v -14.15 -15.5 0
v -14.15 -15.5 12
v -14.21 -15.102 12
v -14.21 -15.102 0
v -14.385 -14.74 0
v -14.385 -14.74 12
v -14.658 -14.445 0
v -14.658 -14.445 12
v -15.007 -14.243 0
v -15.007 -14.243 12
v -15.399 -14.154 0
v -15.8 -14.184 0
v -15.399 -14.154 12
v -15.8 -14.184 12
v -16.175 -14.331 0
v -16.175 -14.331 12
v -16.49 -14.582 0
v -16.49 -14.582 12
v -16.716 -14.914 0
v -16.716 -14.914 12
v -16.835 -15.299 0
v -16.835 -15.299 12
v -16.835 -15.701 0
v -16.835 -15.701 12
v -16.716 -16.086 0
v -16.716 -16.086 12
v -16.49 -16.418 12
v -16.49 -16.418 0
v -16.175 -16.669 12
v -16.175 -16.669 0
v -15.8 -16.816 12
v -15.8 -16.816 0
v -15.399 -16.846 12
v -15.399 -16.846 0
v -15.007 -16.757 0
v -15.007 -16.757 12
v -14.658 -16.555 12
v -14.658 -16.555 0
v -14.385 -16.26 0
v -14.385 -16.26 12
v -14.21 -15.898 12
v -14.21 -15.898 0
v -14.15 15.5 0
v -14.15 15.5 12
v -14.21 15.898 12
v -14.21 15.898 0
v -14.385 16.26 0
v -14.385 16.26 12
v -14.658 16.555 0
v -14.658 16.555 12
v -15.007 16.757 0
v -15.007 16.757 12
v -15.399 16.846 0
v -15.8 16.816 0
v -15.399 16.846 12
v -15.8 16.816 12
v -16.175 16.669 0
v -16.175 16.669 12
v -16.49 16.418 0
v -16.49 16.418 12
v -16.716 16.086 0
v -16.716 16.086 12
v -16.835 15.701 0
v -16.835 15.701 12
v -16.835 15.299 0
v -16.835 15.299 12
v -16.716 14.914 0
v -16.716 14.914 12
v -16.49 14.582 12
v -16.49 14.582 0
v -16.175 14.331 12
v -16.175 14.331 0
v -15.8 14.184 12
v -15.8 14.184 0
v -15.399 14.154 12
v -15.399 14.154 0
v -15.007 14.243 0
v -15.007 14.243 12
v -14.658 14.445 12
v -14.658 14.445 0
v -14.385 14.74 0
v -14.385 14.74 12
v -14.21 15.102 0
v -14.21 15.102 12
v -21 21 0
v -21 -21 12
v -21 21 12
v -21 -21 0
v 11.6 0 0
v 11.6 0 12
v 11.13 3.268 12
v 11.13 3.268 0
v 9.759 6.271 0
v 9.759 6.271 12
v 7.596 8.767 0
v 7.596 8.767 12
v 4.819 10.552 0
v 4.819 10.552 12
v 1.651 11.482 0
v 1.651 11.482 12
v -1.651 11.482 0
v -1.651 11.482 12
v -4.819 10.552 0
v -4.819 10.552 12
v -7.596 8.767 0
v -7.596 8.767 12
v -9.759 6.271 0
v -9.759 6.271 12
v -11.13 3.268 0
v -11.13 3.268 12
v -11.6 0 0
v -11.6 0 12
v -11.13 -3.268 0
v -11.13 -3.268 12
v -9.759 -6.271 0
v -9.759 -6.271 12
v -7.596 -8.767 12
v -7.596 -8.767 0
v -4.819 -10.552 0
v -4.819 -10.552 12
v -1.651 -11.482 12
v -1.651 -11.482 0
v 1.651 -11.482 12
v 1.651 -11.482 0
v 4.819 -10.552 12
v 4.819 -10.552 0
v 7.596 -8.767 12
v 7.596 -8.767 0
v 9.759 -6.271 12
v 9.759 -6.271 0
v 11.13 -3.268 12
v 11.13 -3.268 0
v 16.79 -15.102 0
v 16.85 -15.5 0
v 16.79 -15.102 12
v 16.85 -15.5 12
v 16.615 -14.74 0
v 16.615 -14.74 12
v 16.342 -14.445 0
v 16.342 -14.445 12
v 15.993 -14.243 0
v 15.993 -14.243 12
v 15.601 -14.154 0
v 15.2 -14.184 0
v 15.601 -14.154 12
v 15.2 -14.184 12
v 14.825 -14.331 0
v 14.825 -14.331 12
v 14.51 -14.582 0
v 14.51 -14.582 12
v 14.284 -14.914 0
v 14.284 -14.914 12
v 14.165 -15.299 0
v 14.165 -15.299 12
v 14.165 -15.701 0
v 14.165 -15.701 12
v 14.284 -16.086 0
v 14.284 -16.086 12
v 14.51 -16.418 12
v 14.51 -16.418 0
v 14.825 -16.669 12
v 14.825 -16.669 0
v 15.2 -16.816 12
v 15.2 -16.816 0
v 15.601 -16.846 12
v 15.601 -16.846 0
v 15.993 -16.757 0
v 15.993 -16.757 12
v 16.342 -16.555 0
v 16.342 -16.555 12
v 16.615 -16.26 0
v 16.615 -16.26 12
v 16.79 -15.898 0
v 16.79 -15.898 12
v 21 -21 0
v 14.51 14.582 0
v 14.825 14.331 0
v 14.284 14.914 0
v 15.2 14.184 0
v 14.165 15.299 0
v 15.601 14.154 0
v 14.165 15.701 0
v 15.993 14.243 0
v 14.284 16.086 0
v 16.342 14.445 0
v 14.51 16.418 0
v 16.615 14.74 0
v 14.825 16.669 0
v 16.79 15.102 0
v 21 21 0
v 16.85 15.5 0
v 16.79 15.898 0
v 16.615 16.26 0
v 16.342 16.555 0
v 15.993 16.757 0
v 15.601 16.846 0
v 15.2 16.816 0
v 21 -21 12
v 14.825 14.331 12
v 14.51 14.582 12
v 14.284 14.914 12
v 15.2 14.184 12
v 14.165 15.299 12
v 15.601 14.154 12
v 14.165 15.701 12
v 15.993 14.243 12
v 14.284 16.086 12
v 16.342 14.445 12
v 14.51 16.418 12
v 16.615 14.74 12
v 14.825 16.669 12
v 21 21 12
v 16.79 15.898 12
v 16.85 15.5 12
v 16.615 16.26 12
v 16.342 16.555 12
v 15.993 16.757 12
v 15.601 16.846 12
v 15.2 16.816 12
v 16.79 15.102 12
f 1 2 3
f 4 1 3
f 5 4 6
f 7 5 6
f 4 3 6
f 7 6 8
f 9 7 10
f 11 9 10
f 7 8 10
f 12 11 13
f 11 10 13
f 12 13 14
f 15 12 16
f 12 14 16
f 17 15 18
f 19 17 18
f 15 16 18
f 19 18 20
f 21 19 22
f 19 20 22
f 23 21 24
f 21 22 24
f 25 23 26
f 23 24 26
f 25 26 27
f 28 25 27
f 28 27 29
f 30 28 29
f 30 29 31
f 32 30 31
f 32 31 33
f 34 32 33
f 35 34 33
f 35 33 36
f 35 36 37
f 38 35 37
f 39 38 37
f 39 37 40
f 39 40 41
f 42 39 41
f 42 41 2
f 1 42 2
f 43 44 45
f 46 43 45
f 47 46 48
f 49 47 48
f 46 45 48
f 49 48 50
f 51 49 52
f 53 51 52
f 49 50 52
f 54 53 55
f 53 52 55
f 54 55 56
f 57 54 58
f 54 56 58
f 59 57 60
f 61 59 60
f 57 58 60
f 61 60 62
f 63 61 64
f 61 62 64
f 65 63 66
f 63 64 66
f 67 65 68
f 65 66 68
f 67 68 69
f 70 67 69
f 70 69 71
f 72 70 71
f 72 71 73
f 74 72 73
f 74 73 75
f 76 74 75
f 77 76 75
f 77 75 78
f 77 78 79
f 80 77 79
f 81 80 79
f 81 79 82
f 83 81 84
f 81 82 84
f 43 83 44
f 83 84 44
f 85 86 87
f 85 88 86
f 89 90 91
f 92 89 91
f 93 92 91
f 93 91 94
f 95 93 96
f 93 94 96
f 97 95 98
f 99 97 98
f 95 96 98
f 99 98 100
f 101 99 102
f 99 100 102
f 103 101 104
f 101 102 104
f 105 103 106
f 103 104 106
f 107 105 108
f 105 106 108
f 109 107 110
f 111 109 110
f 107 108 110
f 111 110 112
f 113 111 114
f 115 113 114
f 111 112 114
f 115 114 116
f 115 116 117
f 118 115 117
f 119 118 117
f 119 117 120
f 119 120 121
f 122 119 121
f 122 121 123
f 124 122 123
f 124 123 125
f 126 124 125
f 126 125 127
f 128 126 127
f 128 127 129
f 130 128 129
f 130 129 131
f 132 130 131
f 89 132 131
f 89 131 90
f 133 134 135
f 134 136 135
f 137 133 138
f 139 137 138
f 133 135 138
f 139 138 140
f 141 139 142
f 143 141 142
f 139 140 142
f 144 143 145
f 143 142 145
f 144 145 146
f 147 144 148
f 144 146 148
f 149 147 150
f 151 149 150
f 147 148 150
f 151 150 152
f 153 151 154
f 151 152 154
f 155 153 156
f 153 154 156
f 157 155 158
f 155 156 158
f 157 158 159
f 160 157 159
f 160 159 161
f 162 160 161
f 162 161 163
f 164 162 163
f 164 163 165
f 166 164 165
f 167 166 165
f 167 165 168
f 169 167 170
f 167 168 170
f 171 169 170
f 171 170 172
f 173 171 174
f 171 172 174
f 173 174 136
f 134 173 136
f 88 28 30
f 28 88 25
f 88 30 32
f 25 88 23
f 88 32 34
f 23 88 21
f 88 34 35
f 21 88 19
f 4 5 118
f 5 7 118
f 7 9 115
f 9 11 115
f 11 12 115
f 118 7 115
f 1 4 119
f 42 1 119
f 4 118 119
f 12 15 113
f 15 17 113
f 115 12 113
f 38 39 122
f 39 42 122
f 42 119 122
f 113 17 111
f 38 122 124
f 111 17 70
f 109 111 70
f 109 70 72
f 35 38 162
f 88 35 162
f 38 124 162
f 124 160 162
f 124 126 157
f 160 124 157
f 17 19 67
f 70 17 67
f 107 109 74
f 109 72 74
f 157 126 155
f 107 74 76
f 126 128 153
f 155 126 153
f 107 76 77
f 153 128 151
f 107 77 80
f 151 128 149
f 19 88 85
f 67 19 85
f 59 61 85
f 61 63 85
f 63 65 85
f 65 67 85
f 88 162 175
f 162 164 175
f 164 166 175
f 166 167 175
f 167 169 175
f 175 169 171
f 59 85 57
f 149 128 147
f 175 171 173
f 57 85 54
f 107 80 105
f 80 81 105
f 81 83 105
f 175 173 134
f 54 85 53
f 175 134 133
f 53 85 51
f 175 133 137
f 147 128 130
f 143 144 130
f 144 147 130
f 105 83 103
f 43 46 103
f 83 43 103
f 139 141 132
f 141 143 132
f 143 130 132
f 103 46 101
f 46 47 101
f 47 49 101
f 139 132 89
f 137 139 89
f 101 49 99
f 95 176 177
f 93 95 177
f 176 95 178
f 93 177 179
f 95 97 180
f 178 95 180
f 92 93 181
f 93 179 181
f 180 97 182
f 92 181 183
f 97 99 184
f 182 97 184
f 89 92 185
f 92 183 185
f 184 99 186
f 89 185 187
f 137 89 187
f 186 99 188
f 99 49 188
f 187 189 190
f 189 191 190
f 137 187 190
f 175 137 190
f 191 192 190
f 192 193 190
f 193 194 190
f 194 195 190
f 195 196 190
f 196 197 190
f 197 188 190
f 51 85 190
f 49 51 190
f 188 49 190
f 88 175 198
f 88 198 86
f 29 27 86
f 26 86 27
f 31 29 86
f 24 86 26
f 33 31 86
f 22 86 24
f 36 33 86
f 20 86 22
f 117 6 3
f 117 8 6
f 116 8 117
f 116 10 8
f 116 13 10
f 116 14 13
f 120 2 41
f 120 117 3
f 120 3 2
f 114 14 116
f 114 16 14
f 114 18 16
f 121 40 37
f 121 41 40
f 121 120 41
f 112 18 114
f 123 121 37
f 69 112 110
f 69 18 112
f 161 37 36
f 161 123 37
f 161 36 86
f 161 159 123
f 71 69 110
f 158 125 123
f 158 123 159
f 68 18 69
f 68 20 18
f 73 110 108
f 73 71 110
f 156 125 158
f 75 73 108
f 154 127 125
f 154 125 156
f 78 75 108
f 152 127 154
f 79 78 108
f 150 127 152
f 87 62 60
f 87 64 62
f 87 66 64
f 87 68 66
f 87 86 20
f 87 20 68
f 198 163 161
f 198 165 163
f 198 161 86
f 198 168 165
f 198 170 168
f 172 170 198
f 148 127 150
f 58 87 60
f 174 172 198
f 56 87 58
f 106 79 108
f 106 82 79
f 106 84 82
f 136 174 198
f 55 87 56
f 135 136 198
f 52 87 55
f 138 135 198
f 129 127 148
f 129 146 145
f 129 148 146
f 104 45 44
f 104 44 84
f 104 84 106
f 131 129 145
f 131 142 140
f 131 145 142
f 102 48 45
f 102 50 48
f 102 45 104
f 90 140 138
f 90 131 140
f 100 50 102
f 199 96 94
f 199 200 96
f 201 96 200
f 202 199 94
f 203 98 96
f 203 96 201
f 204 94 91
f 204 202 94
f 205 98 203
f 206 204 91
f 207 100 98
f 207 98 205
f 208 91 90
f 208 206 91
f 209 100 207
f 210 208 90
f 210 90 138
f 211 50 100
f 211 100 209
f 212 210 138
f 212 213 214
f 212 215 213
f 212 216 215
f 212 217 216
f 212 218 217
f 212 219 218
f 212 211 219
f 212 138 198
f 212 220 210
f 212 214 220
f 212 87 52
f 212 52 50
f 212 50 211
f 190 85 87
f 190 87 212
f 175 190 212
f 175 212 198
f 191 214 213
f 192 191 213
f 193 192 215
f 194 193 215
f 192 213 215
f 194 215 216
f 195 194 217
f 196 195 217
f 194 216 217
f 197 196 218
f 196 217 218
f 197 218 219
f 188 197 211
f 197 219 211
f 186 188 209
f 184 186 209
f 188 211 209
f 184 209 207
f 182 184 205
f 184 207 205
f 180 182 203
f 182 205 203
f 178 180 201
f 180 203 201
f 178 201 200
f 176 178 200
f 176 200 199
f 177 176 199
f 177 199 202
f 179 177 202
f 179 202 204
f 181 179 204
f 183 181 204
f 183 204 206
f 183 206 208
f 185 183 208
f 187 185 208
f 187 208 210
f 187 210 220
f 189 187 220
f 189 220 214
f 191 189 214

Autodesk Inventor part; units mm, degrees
sketch "Эскиз1" plane through (0, 0, 0) normal (0, 0, 1) x (1, 0, 0)
  line L0 (21, -21) -> (-21, -21)
  line L1 (-21, -21) -> (-21, 21)
  line L2 (-21, 21) -> (21, 21)
  line L3 (21, 21) -> (21, -21)
  line L4 (21, -21) -> (-21, 21) construction
  line L5 (-21, -21) -> (21, 21) construction
  point P0 (0, 0)
  dimension "d0" = 42
extrude "Выдавливание1" add sketch "Эскиз1" along normal blind 12
sketch "Эскиз2" plane through (0, 0, 12) normal (0, 0, 1) x (1, 0, 0)
  circle A0 centre (0, 0) radius 11.6
  dimension "d3" = 23.2
extrude "Выдавливание2" cut sketch "Эскиз2" against normal up to next
sketch "Эскиз3" plane through (0, 0, 12) normal (0, 0, 1) x (1, 0, 0)
  circle A0 centre (-15.5, 15.5) radius 1.35
  circle A1 centre (15.5, 15.5) radius 1.35
  circle A2 centre (-15.5, -15.5) radius 1.35
  circle A3 centre (15.5, -15.5) radius 1.35
  line L0 (-15.5, 15.5) -> (-15.5, -15.5) construction
  line L1 (-15.5, -15.5) -> (15.5, -15.5) construction
  line L2 (15.5, -15.5) -> (15.5, 15.5) construction
  line L3 (15.5, 15.5) -> (-15.5, 15.5) construction
  line L4 (-15.5, 15.5) -> (15.5, -15.5) construction
  line L5 (15.5, 15.5) -> (-15.5, -15.5) construction
  point P0 (0, 0)
  point P1 (0, 0)
  dimension "d6" = 2.7
  dimension "d7" = 31
extrude "Выдавливание3" cut sketch "Эскиз3" against normal up to next
properties part number "Крепление_мотора_V2"
